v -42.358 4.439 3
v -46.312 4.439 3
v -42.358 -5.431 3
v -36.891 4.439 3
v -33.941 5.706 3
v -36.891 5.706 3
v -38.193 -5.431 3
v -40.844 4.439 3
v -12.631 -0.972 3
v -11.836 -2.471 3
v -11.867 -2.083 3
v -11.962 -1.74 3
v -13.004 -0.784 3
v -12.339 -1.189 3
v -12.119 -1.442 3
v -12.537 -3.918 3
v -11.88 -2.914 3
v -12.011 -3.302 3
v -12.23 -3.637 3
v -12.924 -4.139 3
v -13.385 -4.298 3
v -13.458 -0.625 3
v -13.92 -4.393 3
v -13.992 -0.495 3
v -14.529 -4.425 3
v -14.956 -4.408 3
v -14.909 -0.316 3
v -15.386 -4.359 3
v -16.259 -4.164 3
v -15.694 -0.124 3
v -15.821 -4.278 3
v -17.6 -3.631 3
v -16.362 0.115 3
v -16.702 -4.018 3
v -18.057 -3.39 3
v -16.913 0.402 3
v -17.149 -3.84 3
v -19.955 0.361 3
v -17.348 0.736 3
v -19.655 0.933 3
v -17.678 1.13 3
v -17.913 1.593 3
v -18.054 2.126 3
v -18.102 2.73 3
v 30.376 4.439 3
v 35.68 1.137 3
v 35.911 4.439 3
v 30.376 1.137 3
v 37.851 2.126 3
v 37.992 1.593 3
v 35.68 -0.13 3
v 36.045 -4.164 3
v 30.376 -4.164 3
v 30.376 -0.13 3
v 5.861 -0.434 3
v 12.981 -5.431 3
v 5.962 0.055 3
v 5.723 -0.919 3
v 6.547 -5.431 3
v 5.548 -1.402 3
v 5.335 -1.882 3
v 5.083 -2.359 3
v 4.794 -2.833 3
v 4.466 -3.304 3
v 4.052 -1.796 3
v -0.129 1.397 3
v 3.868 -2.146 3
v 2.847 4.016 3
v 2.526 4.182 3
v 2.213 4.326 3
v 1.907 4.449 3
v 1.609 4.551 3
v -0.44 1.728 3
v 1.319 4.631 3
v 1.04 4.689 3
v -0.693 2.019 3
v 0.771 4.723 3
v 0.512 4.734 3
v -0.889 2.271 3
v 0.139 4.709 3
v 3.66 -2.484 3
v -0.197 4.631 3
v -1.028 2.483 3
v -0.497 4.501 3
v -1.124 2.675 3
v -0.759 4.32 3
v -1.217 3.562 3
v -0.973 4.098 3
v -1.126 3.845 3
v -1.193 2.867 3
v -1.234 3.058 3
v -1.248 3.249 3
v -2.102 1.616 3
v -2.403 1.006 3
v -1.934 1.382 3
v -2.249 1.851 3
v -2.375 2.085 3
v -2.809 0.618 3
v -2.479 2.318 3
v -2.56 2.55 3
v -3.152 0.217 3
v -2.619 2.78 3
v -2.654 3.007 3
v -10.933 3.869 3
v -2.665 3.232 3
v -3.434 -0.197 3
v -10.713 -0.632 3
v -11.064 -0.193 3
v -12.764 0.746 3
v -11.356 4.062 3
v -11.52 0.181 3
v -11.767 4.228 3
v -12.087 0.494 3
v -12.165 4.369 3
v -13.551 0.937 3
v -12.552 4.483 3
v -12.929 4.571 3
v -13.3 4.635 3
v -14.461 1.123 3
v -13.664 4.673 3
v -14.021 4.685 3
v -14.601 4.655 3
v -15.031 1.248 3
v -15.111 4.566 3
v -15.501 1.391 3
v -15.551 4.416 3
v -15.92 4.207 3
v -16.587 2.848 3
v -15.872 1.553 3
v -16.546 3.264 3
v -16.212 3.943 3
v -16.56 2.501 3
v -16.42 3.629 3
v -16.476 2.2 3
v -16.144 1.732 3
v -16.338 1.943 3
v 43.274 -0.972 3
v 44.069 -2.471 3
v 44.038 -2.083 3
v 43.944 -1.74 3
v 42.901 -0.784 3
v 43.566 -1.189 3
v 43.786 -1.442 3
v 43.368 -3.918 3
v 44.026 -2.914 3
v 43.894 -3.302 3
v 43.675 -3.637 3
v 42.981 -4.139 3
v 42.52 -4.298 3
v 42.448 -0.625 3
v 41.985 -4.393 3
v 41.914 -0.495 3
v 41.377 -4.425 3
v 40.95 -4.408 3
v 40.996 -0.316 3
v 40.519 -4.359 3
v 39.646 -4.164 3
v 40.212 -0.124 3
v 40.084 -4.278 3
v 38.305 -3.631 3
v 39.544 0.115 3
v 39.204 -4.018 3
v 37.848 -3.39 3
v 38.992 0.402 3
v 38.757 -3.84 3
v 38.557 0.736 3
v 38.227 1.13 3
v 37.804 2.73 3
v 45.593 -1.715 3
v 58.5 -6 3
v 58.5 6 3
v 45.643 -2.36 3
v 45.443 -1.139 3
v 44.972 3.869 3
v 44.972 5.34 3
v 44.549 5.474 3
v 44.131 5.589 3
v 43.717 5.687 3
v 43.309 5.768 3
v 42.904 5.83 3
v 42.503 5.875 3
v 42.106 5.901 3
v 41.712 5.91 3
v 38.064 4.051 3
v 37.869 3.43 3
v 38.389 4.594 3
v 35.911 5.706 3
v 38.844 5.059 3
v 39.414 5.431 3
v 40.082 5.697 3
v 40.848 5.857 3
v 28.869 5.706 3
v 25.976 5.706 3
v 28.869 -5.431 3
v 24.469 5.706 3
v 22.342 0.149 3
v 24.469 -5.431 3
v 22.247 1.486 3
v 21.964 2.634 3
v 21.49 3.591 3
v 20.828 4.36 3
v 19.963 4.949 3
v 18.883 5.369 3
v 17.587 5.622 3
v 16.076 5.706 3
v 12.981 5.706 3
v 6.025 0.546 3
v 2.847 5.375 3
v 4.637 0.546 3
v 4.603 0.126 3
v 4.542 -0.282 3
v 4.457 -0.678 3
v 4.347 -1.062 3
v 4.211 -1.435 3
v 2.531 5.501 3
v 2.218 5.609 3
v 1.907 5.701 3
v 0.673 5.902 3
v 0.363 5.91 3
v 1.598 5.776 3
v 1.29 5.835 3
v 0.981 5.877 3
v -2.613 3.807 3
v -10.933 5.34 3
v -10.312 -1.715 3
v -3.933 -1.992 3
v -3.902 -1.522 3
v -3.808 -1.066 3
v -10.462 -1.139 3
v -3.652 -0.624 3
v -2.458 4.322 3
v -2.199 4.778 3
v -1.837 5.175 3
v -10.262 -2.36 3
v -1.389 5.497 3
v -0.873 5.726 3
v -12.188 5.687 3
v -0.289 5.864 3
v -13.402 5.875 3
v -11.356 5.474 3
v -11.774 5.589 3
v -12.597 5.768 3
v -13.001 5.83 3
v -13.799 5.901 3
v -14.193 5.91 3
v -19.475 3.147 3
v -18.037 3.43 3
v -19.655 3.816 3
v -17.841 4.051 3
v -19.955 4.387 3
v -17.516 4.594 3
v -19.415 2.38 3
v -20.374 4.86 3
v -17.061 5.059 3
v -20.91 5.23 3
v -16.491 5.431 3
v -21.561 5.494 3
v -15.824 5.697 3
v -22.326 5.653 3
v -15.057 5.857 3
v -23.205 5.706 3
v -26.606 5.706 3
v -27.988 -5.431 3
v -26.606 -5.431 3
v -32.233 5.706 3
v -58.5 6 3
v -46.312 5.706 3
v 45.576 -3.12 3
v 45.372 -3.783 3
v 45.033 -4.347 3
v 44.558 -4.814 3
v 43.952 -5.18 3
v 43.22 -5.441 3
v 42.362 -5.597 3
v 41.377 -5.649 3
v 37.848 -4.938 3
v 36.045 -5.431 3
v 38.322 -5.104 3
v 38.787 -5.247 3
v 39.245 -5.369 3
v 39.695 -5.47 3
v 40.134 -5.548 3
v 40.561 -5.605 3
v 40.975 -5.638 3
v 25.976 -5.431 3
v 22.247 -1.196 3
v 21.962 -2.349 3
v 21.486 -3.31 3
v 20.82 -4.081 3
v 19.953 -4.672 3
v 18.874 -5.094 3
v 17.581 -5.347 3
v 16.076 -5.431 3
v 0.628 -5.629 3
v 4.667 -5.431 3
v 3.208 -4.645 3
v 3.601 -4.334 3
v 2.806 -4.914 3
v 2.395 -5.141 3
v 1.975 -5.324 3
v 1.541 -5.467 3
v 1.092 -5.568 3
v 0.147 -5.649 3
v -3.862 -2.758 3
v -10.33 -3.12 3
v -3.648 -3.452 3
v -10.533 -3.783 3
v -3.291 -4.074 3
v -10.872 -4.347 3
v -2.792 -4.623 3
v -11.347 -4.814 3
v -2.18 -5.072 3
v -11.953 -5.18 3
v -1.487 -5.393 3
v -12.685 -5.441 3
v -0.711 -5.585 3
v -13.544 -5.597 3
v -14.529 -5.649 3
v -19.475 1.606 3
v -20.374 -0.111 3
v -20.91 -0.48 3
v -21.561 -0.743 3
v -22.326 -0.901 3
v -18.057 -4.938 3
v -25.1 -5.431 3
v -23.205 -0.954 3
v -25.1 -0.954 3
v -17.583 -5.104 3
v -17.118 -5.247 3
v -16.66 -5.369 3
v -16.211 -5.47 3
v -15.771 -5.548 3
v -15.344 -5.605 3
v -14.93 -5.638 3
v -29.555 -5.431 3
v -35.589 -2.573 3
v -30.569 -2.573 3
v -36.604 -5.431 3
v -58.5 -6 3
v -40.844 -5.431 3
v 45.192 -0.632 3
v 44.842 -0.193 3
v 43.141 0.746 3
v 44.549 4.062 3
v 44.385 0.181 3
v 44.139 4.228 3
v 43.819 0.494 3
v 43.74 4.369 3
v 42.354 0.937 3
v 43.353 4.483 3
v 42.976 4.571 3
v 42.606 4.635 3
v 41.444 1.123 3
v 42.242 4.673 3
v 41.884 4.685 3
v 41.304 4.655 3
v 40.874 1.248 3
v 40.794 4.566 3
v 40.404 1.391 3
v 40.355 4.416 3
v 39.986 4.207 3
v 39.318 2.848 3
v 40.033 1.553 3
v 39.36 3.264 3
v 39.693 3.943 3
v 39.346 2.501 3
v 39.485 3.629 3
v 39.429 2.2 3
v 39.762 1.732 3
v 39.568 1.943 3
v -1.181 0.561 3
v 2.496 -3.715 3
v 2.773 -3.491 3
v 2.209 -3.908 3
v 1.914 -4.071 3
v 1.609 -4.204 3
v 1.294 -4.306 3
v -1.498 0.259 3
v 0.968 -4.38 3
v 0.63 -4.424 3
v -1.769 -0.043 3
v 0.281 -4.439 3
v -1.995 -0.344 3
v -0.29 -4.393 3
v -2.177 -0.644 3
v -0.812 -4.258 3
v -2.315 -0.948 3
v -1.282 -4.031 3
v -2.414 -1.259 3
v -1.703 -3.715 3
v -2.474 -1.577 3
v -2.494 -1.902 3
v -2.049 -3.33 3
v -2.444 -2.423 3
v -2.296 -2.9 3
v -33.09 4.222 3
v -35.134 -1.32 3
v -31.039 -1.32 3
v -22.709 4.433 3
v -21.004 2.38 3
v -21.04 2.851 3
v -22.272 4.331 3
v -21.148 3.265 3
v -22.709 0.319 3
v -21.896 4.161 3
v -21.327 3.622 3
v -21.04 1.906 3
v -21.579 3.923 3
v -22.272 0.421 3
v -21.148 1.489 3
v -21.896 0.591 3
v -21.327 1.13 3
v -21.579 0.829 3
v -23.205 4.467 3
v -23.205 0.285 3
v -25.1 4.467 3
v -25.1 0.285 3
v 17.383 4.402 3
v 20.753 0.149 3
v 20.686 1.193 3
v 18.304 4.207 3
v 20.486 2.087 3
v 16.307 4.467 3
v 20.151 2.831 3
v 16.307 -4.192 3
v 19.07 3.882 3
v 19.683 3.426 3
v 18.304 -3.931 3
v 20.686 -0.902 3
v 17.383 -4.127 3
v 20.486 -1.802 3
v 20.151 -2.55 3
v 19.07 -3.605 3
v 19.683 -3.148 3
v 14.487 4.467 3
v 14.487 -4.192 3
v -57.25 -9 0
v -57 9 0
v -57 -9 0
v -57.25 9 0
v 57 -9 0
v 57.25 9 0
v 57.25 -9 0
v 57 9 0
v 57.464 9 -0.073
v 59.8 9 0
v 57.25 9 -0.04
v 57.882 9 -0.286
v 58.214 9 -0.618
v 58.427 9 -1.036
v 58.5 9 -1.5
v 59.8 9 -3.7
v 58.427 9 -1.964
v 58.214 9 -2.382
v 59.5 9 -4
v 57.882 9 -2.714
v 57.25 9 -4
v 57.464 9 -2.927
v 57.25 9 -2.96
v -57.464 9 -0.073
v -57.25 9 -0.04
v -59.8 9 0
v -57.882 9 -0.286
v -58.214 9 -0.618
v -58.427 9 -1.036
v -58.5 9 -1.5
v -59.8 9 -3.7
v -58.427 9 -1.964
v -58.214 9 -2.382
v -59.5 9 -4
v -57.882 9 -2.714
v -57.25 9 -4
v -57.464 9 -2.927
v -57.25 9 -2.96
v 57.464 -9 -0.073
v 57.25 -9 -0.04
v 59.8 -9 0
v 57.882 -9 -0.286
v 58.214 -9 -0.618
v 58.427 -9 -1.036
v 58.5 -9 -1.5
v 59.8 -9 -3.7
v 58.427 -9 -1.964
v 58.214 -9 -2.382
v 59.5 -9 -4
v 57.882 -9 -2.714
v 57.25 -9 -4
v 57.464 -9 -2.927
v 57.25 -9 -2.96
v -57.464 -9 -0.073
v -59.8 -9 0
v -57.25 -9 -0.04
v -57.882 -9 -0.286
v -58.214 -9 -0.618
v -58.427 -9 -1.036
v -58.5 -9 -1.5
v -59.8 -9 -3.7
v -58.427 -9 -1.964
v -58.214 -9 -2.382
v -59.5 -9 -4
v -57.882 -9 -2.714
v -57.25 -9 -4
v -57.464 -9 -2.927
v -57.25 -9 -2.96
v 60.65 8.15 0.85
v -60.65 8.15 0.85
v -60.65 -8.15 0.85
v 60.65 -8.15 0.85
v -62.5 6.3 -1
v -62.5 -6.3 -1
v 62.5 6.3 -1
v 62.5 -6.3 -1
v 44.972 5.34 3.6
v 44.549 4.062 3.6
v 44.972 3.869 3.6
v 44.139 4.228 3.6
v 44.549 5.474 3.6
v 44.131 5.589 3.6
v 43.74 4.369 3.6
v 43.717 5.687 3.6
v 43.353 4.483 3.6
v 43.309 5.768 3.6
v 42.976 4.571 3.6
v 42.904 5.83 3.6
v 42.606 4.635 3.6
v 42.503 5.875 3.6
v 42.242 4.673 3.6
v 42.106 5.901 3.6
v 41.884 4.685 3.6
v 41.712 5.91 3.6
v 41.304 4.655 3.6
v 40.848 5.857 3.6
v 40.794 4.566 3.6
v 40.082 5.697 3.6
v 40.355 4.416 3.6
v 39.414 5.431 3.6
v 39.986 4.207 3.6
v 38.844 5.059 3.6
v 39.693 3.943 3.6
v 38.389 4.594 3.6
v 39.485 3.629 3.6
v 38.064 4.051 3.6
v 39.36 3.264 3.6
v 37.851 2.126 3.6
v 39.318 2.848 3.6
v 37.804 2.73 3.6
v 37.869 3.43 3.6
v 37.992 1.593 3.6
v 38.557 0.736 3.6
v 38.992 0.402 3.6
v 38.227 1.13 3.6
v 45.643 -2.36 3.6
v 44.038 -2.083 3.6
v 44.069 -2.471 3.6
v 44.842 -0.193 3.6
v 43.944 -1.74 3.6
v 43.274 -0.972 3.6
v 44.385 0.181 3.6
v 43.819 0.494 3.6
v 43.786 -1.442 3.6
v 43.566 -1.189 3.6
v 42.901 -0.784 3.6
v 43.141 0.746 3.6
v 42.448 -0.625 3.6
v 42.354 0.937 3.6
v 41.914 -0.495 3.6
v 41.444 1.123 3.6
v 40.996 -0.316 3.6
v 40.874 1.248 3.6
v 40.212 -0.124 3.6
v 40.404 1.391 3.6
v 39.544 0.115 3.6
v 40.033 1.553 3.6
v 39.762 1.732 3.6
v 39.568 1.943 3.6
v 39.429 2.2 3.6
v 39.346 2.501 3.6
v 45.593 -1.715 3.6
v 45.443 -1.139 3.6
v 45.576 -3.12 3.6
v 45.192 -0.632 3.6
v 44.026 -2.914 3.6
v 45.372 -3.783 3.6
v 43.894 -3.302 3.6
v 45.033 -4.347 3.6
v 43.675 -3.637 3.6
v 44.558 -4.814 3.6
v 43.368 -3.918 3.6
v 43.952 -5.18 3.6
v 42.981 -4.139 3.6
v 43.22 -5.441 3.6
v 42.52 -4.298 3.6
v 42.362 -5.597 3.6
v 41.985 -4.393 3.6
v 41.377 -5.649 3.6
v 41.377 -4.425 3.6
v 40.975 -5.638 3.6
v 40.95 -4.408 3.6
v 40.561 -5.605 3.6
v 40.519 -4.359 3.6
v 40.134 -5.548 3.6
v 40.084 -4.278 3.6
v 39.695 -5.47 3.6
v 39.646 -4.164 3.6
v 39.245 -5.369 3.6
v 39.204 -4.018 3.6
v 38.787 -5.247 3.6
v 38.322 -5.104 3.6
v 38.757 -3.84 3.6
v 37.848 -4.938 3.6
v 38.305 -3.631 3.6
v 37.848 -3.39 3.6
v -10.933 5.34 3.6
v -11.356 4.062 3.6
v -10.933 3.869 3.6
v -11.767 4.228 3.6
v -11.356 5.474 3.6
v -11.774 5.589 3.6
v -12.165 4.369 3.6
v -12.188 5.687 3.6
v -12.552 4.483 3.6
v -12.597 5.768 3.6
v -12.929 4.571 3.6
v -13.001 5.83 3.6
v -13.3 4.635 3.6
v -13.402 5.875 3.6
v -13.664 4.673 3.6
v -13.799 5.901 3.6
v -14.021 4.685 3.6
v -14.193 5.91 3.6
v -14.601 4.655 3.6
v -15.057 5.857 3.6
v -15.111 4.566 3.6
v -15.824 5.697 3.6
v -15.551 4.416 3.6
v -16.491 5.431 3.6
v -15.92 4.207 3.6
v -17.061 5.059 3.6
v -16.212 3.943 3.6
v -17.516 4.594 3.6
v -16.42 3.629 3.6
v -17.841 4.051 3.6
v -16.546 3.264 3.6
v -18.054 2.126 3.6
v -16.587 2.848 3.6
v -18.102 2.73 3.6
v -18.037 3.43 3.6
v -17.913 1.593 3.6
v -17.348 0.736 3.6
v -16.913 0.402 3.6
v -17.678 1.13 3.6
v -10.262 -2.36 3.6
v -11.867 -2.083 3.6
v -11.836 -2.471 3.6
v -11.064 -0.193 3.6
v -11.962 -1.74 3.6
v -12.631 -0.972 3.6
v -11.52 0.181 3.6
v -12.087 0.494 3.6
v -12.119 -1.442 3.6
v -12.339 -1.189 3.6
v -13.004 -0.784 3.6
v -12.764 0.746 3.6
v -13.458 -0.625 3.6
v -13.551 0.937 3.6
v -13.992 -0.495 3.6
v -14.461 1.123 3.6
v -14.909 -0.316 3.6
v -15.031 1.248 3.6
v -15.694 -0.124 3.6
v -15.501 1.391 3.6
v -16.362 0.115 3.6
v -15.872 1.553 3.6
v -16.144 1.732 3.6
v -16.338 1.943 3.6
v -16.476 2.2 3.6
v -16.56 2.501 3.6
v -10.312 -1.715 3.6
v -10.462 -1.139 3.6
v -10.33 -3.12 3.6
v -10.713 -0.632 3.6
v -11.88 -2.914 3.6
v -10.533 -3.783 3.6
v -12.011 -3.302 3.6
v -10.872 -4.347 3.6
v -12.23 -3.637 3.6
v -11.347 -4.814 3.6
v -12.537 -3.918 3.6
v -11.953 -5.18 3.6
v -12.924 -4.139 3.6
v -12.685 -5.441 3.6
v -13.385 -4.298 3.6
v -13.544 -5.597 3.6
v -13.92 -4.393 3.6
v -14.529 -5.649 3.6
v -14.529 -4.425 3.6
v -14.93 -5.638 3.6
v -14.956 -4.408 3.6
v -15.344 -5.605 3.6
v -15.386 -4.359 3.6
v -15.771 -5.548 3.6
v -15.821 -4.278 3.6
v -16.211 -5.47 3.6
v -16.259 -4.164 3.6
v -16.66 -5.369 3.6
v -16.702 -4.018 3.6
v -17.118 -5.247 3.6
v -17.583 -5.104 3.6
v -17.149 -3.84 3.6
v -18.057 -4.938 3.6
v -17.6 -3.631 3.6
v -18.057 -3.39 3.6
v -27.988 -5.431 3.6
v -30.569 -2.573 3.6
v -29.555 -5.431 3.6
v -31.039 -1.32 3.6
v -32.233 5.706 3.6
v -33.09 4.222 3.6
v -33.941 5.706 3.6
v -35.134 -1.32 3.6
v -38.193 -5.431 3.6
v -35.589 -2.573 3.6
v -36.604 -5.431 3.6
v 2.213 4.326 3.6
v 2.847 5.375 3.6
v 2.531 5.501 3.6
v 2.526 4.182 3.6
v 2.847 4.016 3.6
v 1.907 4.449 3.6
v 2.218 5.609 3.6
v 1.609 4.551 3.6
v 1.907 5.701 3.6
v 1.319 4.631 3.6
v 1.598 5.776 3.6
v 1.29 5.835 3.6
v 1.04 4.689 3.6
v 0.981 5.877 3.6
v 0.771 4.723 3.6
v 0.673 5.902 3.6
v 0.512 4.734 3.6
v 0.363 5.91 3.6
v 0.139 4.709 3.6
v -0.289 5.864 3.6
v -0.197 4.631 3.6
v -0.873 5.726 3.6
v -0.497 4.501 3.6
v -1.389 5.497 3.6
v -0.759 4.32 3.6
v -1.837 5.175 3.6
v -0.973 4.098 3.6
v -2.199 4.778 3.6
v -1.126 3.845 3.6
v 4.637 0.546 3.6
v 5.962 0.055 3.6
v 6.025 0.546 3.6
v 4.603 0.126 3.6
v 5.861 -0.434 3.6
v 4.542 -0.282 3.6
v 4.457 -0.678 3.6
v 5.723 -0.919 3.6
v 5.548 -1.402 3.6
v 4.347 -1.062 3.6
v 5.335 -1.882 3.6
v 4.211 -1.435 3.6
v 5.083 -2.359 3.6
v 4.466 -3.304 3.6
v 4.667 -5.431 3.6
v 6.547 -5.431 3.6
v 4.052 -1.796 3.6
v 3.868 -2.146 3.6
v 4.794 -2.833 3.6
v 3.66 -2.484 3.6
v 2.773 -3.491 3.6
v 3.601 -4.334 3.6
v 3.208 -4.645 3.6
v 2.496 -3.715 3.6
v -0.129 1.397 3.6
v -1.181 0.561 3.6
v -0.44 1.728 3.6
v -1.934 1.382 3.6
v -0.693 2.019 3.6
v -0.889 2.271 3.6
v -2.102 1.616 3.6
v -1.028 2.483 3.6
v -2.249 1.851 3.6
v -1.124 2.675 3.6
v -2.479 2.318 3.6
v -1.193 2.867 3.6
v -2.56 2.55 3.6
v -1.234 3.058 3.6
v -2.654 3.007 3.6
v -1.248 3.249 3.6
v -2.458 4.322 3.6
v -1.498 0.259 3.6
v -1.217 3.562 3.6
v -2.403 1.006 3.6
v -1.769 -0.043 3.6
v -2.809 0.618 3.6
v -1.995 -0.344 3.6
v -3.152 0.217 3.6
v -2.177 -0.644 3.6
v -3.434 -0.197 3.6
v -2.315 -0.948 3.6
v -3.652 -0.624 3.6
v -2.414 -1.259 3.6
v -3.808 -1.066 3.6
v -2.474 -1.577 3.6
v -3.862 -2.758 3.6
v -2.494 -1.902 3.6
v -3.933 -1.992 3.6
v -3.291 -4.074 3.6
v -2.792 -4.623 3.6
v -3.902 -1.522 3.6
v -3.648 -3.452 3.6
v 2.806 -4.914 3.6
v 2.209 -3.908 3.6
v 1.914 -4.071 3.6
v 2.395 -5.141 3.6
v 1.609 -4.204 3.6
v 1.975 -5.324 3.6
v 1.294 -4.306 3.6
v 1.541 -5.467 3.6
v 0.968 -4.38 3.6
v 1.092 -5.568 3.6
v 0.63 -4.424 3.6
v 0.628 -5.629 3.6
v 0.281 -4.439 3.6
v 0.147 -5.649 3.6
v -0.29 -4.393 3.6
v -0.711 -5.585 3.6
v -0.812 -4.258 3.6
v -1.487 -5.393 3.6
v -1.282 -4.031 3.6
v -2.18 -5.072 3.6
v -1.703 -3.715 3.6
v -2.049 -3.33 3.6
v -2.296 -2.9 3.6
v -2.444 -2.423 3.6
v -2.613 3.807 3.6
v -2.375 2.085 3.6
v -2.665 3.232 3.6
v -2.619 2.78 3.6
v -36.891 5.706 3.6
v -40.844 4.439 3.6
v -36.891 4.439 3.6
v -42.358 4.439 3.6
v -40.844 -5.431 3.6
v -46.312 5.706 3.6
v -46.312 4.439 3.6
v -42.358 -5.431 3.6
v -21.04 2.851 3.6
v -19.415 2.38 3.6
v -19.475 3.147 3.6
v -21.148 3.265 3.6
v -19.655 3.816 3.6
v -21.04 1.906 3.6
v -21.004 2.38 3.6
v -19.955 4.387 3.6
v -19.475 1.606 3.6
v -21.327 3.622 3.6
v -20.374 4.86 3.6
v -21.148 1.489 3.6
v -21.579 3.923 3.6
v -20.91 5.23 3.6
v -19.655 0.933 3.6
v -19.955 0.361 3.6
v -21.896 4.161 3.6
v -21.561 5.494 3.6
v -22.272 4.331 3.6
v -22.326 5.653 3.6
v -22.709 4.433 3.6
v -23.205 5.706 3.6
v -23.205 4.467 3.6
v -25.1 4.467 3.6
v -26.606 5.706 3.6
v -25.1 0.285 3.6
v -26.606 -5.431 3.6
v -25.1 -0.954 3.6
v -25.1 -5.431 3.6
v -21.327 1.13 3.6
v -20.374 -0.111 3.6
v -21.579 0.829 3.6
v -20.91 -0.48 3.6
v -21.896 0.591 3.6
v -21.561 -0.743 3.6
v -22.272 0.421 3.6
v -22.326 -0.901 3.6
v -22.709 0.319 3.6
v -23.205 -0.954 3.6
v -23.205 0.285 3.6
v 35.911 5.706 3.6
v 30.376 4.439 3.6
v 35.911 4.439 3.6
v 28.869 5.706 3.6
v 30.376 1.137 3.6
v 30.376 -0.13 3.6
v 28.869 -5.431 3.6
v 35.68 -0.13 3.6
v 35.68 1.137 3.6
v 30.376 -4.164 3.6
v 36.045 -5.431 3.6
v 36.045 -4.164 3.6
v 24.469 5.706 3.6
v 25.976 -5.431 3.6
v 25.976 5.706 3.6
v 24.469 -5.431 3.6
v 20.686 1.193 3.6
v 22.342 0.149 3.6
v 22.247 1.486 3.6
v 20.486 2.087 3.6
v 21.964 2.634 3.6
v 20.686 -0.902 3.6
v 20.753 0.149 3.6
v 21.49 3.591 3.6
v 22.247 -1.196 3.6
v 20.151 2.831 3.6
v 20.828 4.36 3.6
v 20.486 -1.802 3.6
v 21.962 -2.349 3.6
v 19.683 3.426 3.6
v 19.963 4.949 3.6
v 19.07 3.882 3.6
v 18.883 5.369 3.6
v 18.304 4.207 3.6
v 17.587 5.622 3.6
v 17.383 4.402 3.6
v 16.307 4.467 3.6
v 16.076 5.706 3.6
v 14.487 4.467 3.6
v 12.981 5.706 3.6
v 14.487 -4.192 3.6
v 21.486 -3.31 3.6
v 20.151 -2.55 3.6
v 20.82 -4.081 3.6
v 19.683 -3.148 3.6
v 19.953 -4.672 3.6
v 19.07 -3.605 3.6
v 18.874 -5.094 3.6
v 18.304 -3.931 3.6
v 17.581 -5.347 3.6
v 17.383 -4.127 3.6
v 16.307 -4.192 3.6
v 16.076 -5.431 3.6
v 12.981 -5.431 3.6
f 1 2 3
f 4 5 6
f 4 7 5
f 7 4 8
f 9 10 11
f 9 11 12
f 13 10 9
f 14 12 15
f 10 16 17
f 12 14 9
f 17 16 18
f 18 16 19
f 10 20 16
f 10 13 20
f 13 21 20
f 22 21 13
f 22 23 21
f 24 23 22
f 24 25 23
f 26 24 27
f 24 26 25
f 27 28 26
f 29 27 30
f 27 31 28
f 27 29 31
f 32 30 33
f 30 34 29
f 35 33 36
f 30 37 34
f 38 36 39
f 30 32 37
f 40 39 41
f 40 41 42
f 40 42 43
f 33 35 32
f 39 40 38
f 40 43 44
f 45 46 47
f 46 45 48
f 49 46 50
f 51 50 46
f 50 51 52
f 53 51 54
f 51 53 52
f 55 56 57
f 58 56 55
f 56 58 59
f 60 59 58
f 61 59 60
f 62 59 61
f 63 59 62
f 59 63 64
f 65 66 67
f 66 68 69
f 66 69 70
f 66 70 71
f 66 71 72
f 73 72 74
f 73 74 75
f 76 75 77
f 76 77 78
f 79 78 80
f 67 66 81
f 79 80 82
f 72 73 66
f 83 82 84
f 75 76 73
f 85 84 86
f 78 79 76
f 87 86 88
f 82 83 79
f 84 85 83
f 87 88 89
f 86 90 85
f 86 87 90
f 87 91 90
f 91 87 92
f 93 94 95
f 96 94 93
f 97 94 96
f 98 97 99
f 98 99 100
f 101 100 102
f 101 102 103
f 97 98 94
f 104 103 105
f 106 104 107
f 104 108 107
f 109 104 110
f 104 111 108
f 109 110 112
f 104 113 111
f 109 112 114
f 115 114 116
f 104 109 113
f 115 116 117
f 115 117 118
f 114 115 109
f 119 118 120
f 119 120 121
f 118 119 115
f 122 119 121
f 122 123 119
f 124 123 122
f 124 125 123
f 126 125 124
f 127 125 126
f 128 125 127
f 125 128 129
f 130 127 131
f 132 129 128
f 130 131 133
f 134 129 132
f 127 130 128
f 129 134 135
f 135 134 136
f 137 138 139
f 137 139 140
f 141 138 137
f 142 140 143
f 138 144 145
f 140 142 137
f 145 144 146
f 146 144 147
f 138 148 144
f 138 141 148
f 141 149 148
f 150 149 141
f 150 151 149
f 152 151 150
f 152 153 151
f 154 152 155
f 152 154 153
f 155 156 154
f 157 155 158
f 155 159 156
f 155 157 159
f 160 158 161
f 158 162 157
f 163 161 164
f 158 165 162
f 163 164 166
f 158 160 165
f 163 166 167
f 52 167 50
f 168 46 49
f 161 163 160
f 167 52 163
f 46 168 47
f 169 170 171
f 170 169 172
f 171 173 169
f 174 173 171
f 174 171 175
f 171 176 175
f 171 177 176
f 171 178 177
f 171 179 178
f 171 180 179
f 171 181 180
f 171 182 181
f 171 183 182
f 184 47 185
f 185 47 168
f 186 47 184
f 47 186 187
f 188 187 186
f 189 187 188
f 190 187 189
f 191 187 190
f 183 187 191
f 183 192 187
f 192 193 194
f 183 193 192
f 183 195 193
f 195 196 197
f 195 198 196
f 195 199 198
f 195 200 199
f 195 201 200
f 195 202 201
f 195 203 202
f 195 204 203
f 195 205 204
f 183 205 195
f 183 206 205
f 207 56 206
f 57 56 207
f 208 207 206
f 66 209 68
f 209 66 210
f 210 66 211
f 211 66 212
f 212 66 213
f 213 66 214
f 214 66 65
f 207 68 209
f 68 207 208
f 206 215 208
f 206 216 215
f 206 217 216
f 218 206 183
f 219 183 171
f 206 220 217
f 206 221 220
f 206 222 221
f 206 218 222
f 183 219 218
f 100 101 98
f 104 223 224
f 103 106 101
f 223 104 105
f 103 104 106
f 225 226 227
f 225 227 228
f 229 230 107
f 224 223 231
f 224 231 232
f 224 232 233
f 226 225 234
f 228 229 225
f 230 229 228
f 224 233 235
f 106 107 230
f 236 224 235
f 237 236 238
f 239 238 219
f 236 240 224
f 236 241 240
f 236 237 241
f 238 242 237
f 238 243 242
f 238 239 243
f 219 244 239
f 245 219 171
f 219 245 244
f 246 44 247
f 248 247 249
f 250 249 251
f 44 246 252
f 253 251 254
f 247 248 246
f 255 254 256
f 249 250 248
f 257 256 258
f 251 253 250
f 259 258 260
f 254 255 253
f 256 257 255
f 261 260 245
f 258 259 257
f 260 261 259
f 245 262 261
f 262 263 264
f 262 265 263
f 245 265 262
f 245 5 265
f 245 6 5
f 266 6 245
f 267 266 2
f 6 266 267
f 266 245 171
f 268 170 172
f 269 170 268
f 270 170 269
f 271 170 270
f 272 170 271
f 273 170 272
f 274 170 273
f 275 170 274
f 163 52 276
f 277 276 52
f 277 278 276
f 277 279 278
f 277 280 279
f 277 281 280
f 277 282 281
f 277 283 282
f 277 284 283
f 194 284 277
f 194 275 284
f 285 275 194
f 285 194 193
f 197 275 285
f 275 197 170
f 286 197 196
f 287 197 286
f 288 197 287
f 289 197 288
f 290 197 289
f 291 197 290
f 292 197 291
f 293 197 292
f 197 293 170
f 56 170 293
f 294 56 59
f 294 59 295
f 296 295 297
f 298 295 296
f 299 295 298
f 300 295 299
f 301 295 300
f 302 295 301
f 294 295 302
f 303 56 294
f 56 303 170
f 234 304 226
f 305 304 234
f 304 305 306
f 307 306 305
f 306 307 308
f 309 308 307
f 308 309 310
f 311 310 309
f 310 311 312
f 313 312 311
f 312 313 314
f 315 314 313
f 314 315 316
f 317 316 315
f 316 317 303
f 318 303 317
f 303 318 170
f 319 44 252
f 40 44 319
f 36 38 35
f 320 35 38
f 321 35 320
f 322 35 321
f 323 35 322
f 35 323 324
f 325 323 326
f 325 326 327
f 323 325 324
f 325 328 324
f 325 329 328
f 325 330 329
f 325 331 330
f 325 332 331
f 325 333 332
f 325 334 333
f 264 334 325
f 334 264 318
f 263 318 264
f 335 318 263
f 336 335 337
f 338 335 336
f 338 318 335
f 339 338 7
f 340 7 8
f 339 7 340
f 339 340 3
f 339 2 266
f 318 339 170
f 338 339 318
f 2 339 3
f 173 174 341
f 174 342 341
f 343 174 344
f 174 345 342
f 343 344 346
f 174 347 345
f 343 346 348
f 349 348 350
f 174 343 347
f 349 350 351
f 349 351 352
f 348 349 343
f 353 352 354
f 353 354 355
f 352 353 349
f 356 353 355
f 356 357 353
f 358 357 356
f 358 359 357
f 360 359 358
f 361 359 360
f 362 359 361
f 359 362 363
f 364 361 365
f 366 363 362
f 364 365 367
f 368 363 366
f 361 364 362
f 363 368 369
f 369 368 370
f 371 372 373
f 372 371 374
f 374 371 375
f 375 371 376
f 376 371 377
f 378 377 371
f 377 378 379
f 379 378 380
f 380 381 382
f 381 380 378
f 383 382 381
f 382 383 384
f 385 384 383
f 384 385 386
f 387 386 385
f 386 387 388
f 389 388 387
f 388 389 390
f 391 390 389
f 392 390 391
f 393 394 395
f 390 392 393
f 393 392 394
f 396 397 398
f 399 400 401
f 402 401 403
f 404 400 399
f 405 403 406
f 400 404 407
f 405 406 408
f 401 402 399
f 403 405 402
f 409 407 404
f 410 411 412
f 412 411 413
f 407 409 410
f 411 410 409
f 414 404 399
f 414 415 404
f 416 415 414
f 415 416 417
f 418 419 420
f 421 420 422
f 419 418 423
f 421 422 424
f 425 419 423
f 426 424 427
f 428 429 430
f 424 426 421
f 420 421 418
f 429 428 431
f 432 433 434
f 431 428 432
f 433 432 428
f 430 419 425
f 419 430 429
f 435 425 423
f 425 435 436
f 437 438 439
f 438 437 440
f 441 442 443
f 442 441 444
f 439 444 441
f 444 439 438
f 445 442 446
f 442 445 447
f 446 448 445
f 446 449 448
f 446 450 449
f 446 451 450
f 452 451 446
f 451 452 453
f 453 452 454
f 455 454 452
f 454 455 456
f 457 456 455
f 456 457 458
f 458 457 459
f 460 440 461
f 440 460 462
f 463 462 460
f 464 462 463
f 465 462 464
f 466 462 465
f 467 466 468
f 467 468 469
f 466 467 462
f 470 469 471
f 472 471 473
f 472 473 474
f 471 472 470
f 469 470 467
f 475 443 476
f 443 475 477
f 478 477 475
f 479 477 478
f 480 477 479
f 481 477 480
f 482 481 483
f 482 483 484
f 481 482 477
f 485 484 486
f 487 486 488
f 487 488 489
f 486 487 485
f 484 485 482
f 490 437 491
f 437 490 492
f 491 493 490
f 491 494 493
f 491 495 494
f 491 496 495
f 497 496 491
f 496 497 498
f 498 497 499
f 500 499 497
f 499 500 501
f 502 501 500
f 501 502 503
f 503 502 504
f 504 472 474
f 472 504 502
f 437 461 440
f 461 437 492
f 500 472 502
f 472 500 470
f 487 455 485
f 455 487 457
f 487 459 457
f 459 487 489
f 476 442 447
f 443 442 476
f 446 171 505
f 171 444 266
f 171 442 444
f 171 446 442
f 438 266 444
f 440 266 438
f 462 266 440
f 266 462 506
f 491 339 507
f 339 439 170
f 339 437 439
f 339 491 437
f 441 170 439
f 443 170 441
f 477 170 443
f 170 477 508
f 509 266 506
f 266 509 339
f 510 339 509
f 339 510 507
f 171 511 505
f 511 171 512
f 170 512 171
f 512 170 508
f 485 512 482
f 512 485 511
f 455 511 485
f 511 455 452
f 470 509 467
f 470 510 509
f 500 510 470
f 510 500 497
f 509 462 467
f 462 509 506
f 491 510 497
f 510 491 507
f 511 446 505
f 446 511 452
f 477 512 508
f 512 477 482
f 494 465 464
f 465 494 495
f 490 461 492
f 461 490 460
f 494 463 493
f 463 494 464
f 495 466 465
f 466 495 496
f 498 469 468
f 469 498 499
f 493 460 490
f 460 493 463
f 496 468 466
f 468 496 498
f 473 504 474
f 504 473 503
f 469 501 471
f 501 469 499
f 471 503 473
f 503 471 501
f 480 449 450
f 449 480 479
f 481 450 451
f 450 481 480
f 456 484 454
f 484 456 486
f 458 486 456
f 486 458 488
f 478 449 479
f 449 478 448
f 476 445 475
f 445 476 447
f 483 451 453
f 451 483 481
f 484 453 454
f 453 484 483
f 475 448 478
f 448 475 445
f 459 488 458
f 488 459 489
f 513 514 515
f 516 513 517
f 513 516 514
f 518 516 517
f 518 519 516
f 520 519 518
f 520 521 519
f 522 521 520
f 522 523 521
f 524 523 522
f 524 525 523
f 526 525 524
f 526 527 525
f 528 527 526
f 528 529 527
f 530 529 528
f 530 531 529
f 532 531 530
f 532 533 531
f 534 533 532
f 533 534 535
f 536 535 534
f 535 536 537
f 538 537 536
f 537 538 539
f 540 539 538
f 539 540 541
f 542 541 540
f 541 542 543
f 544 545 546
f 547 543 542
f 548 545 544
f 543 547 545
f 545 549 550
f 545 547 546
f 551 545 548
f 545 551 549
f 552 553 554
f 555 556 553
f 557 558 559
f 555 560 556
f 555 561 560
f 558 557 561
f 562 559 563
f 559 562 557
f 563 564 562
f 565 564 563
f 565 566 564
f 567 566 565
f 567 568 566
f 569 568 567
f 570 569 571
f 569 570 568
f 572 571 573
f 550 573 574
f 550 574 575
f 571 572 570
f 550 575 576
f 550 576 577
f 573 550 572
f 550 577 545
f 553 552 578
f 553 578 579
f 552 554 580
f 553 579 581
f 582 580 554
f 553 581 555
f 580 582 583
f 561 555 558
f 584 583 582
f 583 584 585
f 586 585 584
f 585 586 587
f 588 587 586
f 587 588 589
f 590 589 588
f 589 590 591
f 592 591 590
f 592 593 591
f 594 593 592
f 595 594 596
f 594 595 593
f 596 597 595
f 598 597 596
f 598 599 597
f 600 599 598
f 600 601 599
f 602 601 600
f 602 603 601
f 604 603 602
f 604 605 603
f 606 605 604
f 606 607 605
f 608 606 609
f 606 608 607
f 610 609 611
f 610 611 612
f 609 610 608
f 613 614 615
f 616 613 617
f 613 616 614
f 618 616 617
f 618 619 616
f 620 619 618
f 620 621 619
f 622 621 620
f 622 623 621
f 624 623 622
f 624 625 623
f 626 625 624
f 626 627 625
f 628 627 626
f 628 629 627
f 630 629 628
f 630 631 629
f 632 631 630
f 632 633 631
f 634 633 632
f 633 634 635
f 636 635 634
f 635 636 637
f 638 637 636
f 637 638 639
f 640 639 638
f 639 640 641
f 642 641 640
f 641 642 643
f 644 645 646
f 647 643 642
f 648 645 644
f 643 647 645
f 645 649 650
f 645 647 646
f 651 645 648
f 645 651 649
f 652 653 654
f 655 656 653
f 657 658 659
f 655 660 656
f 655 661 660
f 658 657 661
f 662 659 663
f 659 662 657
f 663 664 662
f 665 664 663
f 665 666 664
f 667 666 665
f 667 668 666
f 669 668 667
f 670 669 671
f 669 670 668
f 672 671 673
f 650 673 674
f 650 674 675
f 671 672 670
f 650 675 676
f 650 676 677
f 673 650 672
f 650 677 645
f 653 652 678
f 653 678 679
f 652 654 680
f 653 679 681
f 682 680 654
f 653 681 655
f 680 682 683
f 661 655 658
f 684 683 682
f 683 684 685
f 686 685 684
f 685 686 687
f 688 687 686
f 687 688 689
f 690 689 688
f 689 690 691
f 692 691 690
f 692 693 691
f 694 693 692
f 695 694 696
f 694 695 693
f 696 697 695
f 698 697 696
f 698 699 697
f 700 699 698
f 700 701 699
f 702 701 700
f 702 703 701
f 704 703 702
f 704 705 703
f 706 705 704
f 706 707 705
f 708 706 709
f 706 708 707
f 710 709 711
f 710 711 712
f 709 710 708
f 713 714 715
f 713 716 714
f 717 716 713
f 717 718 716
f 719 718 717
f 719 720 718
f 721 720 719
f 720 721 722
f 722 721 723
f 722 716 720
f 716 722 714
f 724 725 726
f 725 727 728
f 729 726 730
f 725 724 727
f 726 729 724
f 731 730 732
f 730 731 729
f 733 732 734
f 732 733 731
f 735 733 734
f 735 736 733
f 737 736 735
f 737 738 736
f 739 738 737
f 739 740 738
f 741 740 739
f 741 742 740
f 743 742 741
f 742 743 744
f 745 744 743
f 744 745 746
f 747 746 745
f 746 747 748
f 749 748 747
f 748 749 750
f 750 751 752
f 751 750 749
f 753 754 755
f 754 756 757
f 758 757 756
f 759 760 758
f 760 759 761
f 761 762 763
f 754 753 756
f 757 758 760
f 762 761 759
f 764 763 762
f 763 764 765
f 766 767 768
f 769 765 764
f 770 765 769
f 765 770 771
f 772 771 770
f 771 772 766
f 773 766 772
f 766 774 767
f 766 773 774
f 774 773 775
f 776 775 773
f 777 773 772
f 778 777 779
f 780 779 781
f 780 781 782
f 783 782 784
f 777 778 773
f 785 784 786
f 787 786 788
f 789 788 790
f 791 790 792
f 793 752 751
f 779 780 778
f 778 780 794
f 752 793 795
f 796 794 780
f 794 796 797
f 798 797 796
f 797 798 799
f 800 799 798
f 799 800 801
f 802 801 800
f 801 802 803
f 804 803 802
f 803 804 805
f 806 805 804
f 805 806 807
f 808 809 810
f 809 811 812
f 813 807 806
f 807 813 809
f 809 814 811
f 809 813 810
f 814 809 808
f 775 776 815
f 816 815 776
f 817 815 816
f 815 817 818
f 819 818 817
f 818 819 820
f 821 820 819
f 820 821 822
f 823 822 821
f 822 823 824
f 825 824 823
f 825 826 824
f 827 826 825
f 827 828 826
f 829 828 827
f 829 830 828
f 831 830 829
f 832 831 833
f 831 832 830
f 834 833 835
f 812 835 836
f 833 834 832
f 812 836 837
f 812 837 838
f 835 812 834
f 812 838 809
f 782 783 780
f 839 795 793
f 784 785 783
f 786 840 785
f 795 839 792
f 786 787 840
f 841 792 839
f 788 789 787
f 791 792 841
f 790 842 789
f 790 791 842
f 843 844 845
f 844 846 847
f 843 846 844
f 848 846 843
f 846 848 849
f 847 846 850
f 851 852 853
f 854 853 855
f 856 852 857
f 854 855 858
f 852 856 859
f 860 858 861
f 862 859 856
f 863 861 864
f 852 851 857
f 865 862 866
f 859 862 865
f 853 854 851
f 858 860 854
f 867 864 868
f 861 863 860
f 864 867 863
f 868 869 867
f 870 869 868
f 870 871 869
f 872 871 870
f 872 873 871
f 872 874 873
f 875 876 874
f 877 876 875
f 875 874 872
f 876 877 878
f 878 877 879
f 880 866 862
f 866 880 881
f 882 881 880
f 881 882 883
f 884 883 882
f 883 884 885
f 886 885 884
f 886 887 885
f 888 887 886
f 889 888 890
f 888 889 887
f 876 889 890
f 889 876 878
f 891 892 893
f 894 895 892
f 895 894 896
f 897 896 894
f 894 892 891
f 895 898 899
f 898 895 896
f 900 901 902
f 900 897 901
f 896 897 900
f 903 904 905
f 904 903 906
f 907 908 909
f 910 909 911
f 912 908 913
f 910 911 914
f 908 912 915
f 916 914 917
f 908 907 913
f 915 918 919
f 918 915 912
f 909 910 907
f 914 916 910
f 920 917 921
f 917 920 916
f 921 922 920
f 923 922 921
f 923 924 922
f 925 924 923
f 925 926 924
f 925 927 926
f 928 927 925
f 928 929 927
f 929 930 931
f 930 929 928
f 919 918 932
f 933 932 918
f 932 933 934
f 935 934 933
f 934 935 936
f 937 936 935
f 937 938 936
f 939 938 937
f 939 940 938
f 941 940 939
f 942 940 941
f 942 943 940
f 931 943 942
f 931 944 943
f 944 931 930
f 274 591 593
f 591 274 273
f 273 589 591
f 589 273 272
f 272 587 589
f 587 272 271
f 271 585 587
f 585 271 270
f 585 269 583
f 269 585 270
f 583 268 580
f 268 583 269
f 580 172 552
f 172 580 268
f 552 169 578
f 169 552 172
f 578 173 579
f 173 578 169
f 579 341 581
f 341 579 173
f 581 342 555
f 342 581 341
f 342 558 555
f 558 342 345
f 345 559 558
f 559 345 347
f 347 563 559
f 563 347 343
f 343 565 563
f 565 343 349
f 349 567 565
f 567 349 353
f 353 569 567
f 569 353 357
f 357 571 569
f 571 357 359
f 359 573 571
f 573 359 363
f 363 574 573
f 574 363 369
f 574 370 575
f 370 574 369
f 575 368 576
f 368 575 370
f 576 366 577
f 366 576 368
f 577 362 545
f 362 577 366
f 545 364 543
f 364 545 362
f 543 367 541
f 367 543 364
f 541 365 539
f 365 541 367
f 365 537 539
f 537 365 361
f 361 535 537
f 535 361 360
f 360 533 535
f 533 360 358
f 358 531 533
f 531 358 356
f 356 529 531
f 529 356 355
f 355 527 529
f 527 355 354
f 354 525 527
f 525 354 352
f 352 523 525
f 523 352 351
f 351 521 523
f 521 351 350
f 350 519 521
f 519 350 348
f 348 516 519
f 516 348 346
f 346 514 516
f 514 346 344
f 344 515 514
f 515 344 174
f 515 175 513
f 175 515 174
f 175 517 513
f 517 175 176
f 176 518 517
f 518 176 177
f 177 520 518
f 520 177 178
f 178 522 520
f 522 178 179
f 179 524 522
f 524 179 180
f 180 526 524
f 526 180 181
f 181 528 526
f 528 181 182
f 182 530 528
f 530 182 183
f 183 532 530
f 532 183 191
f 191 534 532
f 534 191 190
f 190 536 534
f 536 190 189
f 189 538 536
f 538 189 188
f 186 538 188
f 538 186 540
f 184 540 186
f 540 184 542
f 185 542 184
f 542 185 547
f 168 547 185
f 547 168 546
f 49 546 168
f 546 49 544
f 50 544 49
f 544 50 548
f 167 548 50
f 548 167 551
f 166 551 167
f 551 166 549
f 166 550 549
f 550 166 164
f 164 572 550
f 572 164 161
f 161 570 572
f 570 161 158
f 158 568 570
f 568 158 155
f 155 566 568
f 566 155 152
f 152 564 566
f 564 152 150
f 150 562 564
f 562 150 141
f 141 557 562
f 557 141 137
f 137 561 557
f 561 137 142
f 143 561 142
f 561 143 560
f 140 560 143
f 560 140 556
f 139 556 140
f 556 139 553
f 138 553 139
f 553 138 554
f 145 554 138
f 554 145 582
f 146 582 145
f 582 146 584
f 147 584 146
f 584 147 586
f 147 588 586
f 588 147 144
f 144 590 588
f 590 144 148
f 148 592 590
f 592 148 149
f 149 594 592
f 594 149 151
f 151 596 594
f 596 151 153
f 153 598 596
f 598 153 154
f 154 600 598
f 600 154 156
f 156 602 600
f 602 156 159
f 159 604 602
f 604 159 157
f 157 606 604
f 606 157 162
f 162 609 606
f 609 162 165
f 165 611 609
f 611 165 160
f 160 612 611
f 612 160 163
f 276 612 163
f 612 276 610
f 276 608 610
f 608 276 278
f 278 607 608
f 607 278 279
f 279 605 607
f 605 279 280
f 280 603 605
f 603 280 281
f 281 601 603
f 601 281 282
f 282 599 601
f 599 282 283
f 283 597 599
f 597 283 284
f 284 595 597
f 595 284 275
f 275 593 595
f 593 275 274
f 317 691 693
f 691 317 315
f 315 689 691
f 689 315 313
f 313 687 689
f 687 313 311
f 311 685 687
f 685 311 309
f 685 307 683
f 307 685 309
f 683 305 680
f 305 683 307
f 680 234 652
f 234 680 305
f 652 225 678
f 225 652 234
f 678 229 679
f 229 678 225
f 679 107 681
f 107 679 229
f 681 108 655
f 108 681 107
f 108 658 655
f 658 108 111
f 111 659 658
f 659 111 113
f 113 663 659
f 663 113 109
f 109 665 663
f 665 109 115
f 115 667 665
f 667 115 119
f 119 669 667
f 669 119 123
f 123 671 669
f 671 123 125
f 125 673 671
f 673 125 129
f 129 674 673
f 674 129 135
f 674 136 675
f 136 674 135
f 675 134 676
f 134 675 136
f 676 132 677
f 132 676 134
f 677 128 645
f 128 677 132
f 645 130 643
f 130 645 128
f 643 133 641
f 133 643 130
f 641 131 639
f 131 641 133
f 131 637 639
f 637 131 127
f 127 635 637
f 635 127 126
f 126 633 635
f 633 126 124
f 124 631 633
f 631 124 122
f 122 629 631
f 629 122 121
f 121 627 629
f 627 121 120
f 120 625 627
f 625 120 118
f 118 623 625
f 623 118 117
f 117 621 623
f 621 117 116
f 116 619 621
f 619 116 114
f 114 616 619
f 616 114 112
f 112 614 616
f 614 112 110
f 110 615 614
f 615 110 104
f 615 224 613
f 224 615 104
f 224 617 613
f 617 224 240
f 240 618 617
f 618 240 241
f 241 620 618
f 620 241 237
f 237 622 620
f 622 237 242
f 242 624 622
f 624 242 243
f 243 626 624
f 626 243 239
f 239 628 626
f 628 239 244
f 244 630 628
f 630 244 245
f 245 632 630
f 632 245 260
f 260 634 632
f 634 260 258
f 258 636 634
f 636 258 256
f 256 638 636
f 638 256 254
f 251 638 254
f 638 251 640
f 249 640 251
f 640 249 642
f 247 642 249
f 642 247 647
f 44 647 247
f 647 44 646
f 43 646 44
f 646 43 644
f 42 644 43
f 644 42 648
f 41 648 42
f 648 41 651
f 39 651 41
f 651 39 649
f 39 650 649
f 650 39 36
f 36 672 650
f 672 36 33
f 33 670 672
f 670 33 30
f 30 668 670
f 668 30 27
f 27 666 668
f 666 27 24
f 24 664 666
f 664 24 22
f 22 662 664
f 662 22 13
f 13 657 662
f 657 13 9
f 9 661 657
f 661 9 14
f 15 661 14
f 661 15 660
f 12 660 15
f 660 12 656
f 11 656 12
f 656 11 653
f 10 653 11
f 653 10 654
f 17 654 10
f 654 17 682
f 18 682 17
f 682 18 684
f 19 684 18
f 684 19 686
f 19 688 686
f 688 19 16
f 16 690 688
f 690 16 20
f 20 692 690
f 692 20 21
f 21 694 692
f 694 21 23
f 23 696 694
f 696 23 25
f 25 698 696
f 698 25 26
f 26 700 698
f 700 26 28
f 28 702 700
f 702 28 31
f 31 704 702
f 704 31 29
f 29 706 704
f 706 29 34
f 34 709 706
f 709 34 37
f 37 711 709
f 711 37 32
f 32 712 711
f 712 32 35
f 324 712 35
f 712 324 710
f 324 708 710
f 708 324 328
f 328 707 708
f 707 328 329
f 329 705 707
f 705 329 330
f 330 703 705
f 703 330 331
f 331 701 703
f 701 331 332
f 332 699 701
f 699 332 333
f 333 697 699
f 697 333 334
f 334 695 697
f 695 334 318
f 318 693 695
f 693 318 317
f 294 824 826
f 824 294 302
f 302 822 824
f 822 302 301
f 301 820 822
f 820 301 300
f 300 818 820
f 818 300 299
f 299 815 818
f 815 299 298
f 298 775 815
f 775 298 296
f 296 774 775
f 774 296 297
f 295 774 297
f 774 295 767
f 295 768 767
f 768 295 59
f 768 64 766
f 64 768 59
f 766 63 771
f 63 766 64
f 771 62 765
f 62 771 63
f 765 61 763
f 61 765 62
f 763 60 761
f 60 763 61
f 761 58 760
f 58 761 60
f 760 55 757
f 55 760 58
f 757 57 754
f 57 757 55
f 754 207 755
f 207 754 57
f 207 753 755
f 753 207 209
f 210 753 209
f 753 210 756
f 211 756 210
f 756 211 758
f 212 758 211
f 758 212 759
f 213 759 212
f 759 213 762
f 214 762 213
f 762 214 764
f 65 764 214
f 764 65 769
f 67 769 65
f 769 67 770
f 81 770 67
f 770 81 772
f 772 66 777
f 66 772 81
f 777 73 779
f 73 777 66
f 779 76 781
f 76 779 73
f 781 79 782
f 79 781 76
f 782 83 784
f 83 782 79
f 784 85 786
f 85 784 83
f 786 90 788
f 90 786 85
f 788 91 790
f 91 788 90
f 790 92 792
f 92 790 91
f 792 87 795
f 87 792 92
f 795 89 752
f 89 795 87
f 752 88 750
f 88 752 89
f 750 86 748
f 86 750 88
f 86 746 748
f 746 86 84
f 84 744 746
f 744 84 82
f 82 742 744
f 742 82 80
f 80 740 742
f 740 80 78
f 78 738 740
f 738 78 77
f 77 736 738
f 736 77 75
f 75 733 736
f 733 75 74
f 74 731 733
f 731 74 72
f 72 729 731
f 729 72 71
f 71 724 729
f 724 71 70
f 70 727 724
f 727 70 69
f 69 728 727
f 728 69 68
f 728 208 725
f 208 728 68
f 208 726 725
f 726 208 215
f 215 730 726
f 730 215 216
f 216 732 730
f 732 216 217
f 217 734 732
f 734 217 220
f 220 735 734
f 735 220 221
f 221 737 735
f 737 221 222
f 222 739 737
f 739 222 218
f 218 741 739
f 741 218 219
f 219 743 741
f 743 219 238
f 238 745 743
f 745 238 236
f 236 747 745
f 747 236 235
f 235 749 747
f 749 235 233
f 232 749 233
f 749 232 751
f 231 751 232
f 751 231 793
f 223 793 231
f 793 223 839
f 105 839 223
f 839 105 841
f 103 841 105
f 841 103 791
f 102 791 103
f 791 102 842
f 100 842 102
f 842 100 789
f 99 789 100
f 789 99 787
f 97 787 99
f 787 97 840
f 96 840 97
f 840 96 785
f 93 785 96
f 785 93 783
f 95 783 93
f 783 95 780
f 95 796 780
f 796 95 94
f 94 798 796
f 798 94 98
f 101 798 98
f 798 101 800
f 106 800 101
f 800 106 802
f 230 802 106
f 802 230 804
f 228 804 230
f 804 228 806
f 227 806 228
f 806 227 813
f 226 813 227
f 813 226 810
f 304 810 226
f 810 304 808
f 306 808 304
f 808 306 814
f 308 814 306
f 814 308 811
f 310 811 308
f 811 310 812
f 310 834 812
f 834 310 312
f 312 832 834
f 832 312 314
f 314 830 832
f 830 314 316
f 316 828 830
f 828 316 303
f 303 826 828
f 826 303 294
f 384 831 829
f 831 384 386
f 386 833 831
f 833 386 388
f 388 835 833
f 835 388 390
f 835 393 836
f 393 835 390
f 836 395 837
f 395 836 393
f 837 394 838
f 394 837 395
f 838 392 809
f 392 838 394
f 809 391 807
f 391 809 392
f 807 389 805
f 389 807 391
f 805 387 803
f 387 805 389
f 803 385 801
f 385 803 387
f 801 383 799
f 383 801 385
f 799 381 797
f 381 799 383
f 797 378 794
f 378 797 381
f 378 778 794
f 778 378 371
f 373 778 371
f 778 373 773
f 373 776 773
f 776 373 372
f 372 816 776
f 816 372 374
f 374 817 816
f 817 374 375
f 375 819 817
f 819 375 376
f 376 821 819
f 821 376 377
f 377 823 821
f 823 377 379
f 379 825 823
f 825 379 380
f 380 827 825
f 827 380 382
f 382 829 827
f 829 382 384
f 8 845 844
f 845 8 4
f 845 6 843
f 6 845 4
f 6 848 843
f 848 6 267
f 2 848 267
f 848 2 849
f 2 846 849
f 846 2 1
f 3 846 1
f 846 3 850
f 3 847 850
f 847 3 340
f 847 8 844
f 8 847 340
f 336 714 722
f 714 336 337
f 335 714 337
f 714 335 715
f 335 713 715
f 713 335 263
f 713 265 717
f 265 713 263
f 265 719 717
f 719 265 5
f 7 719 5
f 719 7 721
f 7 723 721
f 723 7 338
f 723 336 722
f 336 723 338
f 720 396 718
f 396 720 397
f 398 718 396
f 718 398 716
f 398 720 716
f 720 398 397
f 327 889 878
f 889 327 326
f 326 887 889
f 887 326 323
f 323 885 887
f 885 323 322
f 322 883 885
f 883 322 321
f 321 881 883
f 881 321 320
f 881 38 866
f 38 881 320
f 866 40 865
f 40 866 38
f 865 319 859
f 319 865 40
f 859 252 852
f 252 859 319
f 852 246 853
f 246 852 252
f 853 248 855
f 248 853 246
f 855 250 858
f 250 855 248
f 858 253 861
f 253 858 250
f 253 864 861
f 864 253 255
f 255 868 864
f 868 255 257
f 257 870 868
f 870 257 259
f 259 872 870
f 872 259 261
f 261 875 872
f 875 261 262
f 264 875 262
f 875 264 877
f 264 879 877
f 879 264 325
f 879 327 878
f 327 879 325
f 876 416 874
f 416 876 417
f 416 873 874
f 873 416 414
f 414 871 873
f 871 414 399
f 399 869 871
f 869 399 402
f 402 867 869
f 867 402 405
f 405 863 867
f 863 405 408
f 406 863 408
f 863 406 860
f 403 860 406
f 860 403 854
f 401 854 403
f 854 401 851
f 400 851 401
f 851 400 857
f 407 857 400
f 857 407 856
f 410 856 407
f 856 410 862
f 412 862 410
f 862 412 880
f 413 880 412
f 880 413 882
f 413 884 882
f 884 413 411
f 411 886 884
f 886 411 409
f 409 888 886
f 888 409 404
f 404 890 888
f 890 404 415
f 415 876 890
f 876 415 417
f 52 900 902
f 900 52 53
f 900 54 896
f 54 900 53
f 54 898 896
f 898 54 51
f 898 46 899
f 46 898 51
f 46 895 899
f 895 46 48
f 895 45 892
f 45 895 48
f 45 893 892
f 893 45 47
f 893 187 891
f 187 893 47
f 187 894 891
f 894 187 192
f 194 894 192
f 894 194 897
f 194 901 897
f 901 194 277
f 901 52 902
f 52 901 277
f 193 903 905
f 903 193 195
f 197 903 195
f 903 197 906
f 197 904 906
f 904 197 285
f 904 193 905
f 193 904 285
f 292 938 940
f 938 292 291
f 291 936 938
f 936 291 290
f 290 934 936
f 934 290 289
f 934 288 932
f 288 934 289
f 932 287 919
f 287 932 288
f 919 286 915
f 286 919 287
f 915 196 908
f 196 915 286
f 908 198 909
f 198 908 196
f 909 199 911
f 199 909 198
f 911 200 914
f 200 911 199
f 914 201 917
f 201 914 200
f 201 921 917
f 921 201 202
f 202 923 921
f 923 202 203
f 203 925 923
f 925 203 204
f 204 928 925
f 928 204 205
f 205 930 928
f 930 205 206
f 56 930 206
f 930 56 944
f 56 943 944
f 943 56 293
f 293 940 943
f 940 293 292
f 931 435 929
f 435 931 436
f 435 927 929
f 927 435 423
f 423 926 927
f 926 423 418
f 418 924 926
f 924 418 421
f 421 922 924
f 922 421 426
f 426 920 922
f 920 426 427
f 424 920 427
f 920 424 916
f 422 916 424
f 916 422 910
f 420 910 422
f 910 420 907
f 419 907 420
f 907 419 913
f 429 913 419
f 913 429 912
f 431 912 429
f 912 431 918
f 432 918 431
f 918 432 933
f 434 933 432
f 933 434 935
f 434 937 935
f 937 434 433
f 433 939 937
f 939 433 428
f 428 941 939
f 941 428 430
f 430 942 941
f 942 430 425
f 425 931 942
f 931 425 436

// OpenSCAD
/************** Low-Profile Milwaukee Packout Case Handle Labels *******************
*
* Updated By ejwill https://github.com/ejwill/milwaukee-scad
* 
* Description:
* This is a customizable label for the Milwaukee Packout Low-Profile Handle.
* The label can be customized with text, font, color, and size.
* The label can be embedded into the handle or printed on the face. 
*
* Compatible with the following Milwaukee Packout Low-Profile Organizers:
* 5 compartment 48-22-8436 (compact low profile)
* 11 compartment 48-22-8431 (low profile)
*
* Originally from Benjamen Johnson's Low-Profile Packout Handle Label. <https://3dprints.electronsmith.com/low-profile-packout-handle-labels/>
* Benjamen Johnson <workshop.electronsmith.com>
*
* Changes: 
* - Added option to embed text into the handle
* - Updated for use on MakerWorld
* - Added option to print on face
* - Updated to OpenScad 2024.12.11
*
* Licesnse: Creative Commons - Attribution - Share Alike
*           https://creativecommons.org/licenses/by-sa/4.0/
*******************************************************************************/

/*[Case]*/

//What Case is the handle for?
caseType = "compact low profile"; // [compact low profile, low profile]

/* [Hidden] */
// Length of the base (face of the handle)
base_length = (caseType == "compact low profile") ? 117 : 144;
// Width of the base (face of the handle)
base_width = (caseType == "compact low profile") ? 18 : 20;
// Diameter of catch pocket
catch_dia = 3;
// How wide the catch should be
catch_length = 8.5;
// How hight the catch should be
catch_height = 7;
// Height of the base (thickness of the label)
base_height = 3;

/* [Handle Options] */
//Handle Color
handle_color = "#000000"; //color
// How tight the catch should be
catch_adjust_tightness = "normal"; // [loose, normal, tight]
catch_adjust = (catch_adjust_tightness == "loose") ? 0.95 : 
               (catch_adjust_tightness == "normal") ? 1 : 1.05;


/*[Label Options]*/
// What do you want the label to say?
label = "TAPS & DIES";

// Which font do you want to use
font_style ="Open Sans"; // font

// How big you want the text
font_size = 11;//[0:0.5:15]

// How thick the font is (back to front)
font_thickness = 0.6;

//Label Color
label_Color = "#ffffff"; //color

// Adjust the length of the label
length_adjust = 1; //[0.95:0.001:1.05]

// Option to embed the text into the handle
embed_text = false; //[false, true]

/* [Print Options] */
// Print on Face
// Reconmended to print on face if you are embedding the text
print_on_face = false; //[false, true]

/*[Hidden]*/
// Calculations
adj_base_len = base_length * length_adjust;
adj_catch_dia = catch_dia * catch_adjust;

// create vector for defining the base
BASE_DEF = [adj_base_len,base_width,base_height];

// figure out where the end of the label will be
end_pos = (adj_base_len+2*base_height)/2;

// create vectors for defining the catch and catch position
CATCH_DEF = [catch_length,base_width,catch_height];
CATCH_POS = [-end_pos,0,-catch_height/2+base_height];
CATCH_CUT_POS = [-adj_base_len/2+adj_catch_dia/2,0,-adj_catch_dia/2];

LONG_CHAMFER_DEF = [2*end_pos,base_height*sqrt(2),10];
LONG_CHAMFER_POS = [0,base_width/2,base_height];


/*******************************************************************************
* Important definitions
*******************************************************************************/
INVERT_X =[[-1,0,0],[0,1,0],[0,0,1]];
INVERT_Y =[[1,0,0],[0,-1,0],[0,0,1]];

$dl= 0.01;

/*******************************************************************************
* Make the label
*******************************************************************************/

module handle() {
    color(handle_color){
        difference(){
            union(){
                translate([0,0,base_height/2])
                cube(BASE_DEF,center = true);
            
                translate(CATCH_POS)
                cube(CATCH_DEF,center=true);
            
                translate(INVERT_X * CATCH_POS)
                cube(CATCH_DEF,center=true);
            } //end union
            
            //chamfer long edges
            translate(LONG_CHAMFER_POS)
            rotate([45,0,0])
            cube(LONG_CHAMFER_DEF,center = true);
            
            translate(INVERT_Y*LONG_CHAMFER_POS)
            rotate([-45,0,0])
            cube(LONG_CHAMFER_DEF,center = true);
            
            //chamfer top ends
            translate([-end_pos-3*sqrt(2),0,base_height])
            rotate([0,45,0])
            cube([base_height*sqrt(2)+2*3,base_width+10,20],center = true);
            
            translate([end_pos+3*sqrt(2),0,base_height])
            rotate([0,-45,0])
            cube([base_height*sqrt(2)+2*3,base_width+10,20],center = true);
            
            // chamfer bottom ends
            translate([end_pos+3*sqrt(2)+2,0,-base_height])
            rotate([0,45,0])
            cube([base_height*sqrt(2)+2*3,base_width+10,20],center = true);
            
            translate([-end_pos-3*sqrt(2)-2,0,-base_height])
            rotate([0,-45,0])
            cube([base_height*sqrt(2)+2*3,base_width+10,20],center = true);
            
            // chamfer corners
            corner_cut = 1.3;
            translate([-end_pos-3*sqrt(2)-corner_cut,base_width/2,base_height])
            rotate([0,0,-45])
            cube([base_height*sqrt(2)+2*3,base_width+10,20],center = true);

            translate([-end_pos-3*sqrt(2)-corner_cut,-base_width/2,base_height])
            rotate([0,0,45])
            cube([base_height*sqrt(2)+2*3,base_width+10,20],center = true);

            translate([end_pos+3*sqrt(2)+corner_cut,base_width/2,base_height])
            rotate([0,0,45])
            cube([base_height*sqrt(2)+2*3,base_width+10,20],center = true);

            translate([end_pos+3*sqrt(2)+corner_cut,-base_width/2,base_height])
            rotate([0,0,-45])
            cube([base_height*sqrt(2)+2*3,base_width+10,20],center = true);

            // make cutout for the catches
            translate(CATCH_CUT_POS)
            rotate([90,0,0])
            cylinder(d = adj_catch_dia,h = base_width+$dl,$fn=20,center = true);
            
            translate(INVERT_X * CATCH_CUT_POS)
            rotate([90,0,0])
            cylinder(d = adj_catch_dia,h = base_width+$dl,$fn=20,center = true);

            // add the label text
            if (embed_text) {
                translate([0,0,base_height - font_thickness])
                color(label_Color)
                linear_extrude(height = font_thickness)
                text(text = label, font = font_style, size =font_size, valign="center",halign = "center");
            }
        }
    }// end difference}
}

if(embed_text){
    label_Color = handle_color;
    if(print_on_face){
        rotate([180, 0, 0]) {
            handle();
        }
    } else {
        handle();
    }
} else {
    if(print_on_face){
        rotate([180, 0, 0]) {
            handle();
        }
    } else {
        handle();
    }
    translate([0,0,base_height])
    color(label_Color)
    linear_extrude(height = font_thickness)
        text(text = label, font = font_style, size = font_size, valign="center", halign = "center");
}
